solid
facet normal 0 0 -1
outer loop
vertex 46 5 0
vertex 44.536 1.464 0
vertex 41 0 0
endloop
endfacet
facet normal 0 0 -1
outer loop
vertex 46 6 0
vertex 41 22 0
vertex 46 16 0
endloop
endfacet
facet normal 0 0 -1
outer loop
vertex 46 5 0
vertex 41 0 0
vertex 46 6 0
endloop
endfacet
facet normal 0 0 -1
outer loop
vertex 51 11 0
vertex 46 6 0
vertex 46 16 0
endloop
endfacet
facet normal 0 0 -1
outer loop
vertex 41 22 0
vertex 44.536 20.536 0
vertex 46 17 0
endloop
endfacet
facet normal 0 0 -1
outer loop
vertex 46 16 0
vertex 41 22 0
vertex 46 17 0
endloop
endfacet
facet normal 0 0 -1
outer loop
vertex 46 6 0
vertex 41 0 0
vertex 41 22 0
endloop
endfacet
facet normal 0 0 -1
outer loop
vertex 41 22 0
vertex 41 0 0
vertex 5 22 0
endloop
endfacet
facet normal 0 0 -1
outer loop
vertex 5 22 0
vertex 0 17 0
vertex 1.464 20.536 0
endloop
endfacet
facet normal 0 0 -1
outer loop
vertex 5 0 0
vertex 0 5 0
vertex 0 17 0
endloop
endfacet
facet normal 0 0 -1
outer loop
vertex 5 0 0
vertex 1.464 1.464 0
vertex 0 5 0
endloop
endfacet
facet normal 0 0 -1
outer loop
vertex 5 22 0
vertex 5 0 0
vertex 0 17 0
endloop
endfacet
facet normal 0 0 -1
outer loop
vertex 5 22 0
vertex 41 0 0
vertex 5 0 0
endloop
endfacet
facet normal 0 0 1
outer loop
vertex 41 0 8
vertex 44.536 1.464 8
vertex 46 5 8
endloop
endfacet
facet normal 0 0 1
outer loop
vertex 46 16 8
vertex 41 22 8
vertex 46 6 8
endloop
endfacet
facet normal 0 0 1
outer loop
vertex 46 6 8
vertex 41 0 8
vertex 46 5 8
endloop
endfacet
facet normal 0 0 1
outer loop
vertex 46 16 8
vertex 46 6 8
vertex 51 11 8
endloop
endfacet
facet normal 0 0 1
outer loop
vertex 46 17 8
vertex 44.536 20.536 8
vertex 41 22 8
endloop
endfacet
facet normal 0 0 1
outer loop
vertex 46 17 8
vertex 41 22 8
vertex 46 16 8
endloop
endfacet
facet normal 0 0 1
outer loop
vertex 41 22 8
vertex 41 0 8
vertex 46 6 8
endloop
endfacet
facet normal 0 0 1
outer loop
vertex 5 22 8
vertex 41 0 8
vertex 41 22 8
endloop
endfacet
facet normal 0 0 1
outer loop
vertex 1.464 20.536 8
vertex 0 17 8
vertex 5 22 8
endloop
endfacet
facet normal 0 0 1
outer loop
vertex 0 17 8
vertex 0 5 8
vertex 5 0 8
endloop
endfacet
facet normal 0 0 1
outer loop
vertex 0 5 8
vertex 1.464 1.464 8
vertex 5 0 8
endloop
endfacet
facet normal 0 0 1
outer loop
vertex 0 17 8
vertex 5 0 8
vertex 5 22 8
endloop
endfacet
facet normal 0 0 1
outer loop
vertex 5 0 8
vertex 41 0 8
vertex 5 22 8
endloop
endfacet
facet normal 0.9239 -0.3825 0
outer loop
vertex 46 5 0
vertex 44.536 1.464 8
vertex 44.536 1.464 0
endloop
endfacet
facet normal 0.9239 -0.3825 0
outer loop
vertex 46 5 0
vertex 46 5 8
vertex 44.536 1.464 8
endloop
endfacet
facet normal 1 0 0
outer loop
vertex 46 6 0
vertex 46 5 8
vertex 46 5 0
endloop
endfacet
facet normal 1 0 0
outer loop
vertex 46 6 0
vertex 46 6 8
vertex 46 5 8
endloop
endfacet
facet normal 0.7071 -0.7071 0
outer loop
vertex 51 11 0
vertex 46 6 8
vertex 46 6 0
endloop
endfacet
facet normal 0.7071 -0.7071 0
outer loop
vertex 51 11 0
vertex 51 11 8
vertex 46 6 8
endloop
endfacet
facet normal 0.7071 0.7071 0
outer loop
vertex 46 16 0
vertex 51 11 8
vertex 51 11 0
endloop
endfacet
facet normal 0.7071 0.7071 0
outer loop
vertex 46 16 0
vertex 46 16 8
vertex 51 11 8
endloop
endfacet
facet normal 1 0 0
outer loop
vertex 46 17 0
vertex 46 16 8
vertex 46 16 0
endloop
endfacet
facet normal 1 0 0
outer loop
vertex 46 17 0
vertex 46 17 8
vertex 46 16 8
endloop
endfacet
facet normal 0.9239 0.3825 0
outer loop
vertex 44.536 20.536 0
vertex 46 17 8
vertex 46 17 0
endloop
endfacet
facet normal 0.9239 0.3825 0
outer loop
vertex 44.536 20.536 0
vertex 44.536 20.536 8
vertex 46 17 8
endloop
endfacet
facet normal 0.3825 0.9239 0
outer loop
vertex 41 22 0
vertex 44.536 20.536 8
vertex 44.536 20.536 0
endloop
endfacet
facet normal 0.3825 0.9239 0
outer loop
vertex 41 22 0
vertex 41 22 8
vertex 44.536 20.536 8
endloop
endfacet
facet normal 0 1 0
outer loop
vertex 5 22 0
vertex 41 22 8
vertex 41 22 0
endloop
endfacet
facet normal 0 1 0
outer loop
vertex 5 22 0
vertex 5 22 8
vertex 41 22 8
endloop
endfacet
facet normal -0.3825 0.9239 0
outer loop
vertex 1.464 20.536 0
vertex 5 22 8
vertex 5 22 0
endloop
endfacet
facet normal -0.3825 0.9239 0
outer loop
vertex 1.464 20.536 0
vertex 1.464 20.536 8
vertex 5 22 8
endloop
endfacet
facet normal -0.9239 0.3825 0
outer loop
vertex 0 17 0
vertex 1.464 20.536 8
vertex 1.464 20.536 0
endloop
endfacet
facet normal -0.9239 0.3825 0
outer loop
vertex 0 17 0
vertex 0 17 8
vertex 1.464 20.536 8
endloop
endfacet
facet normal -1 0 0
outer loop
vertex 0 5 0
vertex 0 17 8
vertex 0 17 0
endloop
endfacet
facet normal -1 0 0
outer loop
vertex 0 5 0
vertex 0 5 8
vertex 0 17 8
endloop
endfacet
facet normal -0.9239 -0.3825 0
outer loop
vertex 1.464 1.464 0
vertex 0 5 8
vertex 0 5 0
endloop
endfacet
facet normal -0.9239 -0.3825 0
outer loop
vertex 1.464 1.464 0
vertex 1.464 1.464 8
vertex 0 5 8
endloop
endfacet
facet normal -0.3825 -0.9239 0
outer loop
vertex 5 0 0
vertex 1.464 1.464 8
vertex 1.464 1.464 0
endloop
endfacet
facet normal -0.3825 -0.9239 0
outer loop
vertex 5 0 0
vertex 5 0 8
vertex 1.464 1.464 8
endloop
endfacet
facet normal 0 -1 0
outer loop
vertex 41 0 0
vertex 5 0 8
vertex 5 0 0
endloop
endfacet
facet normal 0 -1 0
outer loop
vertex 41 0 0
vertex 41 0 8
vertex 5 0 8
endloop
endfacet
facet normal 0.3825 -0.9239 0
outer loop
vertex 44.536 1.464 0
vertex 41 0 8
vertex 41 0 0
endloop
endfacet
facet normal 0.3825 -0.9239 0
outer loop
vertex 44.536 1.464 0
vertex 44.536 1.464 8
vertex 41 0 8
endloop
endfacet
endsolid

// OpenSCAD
$fn = 32;

// ----------------------------------------------------------------------
// Ratchet pawl: 46 x 22 mm body, beak 5 mm с правого торца
// ----------------------------------------------------------------------

// --- parameters (mm) ---
profile_height = 8;       // extrusion height
profile_points = 15;      // points of the closed outline

profile = [[0, 5], [1.464, 1.464], [5, 0], [41, 0], [44.536, 1.464], [46, 5], [46, 6], [51, 11], [46, 16], [46, 17], [44.536, 20.536], [41, 22], [5, 22], [1.464, 20.536], [0, 17]];  // single closed polygon, 15 points, counter clockwise

// --- the one profile operation ---
linear_extrude(height = profile_height) polygon(points = profile);
